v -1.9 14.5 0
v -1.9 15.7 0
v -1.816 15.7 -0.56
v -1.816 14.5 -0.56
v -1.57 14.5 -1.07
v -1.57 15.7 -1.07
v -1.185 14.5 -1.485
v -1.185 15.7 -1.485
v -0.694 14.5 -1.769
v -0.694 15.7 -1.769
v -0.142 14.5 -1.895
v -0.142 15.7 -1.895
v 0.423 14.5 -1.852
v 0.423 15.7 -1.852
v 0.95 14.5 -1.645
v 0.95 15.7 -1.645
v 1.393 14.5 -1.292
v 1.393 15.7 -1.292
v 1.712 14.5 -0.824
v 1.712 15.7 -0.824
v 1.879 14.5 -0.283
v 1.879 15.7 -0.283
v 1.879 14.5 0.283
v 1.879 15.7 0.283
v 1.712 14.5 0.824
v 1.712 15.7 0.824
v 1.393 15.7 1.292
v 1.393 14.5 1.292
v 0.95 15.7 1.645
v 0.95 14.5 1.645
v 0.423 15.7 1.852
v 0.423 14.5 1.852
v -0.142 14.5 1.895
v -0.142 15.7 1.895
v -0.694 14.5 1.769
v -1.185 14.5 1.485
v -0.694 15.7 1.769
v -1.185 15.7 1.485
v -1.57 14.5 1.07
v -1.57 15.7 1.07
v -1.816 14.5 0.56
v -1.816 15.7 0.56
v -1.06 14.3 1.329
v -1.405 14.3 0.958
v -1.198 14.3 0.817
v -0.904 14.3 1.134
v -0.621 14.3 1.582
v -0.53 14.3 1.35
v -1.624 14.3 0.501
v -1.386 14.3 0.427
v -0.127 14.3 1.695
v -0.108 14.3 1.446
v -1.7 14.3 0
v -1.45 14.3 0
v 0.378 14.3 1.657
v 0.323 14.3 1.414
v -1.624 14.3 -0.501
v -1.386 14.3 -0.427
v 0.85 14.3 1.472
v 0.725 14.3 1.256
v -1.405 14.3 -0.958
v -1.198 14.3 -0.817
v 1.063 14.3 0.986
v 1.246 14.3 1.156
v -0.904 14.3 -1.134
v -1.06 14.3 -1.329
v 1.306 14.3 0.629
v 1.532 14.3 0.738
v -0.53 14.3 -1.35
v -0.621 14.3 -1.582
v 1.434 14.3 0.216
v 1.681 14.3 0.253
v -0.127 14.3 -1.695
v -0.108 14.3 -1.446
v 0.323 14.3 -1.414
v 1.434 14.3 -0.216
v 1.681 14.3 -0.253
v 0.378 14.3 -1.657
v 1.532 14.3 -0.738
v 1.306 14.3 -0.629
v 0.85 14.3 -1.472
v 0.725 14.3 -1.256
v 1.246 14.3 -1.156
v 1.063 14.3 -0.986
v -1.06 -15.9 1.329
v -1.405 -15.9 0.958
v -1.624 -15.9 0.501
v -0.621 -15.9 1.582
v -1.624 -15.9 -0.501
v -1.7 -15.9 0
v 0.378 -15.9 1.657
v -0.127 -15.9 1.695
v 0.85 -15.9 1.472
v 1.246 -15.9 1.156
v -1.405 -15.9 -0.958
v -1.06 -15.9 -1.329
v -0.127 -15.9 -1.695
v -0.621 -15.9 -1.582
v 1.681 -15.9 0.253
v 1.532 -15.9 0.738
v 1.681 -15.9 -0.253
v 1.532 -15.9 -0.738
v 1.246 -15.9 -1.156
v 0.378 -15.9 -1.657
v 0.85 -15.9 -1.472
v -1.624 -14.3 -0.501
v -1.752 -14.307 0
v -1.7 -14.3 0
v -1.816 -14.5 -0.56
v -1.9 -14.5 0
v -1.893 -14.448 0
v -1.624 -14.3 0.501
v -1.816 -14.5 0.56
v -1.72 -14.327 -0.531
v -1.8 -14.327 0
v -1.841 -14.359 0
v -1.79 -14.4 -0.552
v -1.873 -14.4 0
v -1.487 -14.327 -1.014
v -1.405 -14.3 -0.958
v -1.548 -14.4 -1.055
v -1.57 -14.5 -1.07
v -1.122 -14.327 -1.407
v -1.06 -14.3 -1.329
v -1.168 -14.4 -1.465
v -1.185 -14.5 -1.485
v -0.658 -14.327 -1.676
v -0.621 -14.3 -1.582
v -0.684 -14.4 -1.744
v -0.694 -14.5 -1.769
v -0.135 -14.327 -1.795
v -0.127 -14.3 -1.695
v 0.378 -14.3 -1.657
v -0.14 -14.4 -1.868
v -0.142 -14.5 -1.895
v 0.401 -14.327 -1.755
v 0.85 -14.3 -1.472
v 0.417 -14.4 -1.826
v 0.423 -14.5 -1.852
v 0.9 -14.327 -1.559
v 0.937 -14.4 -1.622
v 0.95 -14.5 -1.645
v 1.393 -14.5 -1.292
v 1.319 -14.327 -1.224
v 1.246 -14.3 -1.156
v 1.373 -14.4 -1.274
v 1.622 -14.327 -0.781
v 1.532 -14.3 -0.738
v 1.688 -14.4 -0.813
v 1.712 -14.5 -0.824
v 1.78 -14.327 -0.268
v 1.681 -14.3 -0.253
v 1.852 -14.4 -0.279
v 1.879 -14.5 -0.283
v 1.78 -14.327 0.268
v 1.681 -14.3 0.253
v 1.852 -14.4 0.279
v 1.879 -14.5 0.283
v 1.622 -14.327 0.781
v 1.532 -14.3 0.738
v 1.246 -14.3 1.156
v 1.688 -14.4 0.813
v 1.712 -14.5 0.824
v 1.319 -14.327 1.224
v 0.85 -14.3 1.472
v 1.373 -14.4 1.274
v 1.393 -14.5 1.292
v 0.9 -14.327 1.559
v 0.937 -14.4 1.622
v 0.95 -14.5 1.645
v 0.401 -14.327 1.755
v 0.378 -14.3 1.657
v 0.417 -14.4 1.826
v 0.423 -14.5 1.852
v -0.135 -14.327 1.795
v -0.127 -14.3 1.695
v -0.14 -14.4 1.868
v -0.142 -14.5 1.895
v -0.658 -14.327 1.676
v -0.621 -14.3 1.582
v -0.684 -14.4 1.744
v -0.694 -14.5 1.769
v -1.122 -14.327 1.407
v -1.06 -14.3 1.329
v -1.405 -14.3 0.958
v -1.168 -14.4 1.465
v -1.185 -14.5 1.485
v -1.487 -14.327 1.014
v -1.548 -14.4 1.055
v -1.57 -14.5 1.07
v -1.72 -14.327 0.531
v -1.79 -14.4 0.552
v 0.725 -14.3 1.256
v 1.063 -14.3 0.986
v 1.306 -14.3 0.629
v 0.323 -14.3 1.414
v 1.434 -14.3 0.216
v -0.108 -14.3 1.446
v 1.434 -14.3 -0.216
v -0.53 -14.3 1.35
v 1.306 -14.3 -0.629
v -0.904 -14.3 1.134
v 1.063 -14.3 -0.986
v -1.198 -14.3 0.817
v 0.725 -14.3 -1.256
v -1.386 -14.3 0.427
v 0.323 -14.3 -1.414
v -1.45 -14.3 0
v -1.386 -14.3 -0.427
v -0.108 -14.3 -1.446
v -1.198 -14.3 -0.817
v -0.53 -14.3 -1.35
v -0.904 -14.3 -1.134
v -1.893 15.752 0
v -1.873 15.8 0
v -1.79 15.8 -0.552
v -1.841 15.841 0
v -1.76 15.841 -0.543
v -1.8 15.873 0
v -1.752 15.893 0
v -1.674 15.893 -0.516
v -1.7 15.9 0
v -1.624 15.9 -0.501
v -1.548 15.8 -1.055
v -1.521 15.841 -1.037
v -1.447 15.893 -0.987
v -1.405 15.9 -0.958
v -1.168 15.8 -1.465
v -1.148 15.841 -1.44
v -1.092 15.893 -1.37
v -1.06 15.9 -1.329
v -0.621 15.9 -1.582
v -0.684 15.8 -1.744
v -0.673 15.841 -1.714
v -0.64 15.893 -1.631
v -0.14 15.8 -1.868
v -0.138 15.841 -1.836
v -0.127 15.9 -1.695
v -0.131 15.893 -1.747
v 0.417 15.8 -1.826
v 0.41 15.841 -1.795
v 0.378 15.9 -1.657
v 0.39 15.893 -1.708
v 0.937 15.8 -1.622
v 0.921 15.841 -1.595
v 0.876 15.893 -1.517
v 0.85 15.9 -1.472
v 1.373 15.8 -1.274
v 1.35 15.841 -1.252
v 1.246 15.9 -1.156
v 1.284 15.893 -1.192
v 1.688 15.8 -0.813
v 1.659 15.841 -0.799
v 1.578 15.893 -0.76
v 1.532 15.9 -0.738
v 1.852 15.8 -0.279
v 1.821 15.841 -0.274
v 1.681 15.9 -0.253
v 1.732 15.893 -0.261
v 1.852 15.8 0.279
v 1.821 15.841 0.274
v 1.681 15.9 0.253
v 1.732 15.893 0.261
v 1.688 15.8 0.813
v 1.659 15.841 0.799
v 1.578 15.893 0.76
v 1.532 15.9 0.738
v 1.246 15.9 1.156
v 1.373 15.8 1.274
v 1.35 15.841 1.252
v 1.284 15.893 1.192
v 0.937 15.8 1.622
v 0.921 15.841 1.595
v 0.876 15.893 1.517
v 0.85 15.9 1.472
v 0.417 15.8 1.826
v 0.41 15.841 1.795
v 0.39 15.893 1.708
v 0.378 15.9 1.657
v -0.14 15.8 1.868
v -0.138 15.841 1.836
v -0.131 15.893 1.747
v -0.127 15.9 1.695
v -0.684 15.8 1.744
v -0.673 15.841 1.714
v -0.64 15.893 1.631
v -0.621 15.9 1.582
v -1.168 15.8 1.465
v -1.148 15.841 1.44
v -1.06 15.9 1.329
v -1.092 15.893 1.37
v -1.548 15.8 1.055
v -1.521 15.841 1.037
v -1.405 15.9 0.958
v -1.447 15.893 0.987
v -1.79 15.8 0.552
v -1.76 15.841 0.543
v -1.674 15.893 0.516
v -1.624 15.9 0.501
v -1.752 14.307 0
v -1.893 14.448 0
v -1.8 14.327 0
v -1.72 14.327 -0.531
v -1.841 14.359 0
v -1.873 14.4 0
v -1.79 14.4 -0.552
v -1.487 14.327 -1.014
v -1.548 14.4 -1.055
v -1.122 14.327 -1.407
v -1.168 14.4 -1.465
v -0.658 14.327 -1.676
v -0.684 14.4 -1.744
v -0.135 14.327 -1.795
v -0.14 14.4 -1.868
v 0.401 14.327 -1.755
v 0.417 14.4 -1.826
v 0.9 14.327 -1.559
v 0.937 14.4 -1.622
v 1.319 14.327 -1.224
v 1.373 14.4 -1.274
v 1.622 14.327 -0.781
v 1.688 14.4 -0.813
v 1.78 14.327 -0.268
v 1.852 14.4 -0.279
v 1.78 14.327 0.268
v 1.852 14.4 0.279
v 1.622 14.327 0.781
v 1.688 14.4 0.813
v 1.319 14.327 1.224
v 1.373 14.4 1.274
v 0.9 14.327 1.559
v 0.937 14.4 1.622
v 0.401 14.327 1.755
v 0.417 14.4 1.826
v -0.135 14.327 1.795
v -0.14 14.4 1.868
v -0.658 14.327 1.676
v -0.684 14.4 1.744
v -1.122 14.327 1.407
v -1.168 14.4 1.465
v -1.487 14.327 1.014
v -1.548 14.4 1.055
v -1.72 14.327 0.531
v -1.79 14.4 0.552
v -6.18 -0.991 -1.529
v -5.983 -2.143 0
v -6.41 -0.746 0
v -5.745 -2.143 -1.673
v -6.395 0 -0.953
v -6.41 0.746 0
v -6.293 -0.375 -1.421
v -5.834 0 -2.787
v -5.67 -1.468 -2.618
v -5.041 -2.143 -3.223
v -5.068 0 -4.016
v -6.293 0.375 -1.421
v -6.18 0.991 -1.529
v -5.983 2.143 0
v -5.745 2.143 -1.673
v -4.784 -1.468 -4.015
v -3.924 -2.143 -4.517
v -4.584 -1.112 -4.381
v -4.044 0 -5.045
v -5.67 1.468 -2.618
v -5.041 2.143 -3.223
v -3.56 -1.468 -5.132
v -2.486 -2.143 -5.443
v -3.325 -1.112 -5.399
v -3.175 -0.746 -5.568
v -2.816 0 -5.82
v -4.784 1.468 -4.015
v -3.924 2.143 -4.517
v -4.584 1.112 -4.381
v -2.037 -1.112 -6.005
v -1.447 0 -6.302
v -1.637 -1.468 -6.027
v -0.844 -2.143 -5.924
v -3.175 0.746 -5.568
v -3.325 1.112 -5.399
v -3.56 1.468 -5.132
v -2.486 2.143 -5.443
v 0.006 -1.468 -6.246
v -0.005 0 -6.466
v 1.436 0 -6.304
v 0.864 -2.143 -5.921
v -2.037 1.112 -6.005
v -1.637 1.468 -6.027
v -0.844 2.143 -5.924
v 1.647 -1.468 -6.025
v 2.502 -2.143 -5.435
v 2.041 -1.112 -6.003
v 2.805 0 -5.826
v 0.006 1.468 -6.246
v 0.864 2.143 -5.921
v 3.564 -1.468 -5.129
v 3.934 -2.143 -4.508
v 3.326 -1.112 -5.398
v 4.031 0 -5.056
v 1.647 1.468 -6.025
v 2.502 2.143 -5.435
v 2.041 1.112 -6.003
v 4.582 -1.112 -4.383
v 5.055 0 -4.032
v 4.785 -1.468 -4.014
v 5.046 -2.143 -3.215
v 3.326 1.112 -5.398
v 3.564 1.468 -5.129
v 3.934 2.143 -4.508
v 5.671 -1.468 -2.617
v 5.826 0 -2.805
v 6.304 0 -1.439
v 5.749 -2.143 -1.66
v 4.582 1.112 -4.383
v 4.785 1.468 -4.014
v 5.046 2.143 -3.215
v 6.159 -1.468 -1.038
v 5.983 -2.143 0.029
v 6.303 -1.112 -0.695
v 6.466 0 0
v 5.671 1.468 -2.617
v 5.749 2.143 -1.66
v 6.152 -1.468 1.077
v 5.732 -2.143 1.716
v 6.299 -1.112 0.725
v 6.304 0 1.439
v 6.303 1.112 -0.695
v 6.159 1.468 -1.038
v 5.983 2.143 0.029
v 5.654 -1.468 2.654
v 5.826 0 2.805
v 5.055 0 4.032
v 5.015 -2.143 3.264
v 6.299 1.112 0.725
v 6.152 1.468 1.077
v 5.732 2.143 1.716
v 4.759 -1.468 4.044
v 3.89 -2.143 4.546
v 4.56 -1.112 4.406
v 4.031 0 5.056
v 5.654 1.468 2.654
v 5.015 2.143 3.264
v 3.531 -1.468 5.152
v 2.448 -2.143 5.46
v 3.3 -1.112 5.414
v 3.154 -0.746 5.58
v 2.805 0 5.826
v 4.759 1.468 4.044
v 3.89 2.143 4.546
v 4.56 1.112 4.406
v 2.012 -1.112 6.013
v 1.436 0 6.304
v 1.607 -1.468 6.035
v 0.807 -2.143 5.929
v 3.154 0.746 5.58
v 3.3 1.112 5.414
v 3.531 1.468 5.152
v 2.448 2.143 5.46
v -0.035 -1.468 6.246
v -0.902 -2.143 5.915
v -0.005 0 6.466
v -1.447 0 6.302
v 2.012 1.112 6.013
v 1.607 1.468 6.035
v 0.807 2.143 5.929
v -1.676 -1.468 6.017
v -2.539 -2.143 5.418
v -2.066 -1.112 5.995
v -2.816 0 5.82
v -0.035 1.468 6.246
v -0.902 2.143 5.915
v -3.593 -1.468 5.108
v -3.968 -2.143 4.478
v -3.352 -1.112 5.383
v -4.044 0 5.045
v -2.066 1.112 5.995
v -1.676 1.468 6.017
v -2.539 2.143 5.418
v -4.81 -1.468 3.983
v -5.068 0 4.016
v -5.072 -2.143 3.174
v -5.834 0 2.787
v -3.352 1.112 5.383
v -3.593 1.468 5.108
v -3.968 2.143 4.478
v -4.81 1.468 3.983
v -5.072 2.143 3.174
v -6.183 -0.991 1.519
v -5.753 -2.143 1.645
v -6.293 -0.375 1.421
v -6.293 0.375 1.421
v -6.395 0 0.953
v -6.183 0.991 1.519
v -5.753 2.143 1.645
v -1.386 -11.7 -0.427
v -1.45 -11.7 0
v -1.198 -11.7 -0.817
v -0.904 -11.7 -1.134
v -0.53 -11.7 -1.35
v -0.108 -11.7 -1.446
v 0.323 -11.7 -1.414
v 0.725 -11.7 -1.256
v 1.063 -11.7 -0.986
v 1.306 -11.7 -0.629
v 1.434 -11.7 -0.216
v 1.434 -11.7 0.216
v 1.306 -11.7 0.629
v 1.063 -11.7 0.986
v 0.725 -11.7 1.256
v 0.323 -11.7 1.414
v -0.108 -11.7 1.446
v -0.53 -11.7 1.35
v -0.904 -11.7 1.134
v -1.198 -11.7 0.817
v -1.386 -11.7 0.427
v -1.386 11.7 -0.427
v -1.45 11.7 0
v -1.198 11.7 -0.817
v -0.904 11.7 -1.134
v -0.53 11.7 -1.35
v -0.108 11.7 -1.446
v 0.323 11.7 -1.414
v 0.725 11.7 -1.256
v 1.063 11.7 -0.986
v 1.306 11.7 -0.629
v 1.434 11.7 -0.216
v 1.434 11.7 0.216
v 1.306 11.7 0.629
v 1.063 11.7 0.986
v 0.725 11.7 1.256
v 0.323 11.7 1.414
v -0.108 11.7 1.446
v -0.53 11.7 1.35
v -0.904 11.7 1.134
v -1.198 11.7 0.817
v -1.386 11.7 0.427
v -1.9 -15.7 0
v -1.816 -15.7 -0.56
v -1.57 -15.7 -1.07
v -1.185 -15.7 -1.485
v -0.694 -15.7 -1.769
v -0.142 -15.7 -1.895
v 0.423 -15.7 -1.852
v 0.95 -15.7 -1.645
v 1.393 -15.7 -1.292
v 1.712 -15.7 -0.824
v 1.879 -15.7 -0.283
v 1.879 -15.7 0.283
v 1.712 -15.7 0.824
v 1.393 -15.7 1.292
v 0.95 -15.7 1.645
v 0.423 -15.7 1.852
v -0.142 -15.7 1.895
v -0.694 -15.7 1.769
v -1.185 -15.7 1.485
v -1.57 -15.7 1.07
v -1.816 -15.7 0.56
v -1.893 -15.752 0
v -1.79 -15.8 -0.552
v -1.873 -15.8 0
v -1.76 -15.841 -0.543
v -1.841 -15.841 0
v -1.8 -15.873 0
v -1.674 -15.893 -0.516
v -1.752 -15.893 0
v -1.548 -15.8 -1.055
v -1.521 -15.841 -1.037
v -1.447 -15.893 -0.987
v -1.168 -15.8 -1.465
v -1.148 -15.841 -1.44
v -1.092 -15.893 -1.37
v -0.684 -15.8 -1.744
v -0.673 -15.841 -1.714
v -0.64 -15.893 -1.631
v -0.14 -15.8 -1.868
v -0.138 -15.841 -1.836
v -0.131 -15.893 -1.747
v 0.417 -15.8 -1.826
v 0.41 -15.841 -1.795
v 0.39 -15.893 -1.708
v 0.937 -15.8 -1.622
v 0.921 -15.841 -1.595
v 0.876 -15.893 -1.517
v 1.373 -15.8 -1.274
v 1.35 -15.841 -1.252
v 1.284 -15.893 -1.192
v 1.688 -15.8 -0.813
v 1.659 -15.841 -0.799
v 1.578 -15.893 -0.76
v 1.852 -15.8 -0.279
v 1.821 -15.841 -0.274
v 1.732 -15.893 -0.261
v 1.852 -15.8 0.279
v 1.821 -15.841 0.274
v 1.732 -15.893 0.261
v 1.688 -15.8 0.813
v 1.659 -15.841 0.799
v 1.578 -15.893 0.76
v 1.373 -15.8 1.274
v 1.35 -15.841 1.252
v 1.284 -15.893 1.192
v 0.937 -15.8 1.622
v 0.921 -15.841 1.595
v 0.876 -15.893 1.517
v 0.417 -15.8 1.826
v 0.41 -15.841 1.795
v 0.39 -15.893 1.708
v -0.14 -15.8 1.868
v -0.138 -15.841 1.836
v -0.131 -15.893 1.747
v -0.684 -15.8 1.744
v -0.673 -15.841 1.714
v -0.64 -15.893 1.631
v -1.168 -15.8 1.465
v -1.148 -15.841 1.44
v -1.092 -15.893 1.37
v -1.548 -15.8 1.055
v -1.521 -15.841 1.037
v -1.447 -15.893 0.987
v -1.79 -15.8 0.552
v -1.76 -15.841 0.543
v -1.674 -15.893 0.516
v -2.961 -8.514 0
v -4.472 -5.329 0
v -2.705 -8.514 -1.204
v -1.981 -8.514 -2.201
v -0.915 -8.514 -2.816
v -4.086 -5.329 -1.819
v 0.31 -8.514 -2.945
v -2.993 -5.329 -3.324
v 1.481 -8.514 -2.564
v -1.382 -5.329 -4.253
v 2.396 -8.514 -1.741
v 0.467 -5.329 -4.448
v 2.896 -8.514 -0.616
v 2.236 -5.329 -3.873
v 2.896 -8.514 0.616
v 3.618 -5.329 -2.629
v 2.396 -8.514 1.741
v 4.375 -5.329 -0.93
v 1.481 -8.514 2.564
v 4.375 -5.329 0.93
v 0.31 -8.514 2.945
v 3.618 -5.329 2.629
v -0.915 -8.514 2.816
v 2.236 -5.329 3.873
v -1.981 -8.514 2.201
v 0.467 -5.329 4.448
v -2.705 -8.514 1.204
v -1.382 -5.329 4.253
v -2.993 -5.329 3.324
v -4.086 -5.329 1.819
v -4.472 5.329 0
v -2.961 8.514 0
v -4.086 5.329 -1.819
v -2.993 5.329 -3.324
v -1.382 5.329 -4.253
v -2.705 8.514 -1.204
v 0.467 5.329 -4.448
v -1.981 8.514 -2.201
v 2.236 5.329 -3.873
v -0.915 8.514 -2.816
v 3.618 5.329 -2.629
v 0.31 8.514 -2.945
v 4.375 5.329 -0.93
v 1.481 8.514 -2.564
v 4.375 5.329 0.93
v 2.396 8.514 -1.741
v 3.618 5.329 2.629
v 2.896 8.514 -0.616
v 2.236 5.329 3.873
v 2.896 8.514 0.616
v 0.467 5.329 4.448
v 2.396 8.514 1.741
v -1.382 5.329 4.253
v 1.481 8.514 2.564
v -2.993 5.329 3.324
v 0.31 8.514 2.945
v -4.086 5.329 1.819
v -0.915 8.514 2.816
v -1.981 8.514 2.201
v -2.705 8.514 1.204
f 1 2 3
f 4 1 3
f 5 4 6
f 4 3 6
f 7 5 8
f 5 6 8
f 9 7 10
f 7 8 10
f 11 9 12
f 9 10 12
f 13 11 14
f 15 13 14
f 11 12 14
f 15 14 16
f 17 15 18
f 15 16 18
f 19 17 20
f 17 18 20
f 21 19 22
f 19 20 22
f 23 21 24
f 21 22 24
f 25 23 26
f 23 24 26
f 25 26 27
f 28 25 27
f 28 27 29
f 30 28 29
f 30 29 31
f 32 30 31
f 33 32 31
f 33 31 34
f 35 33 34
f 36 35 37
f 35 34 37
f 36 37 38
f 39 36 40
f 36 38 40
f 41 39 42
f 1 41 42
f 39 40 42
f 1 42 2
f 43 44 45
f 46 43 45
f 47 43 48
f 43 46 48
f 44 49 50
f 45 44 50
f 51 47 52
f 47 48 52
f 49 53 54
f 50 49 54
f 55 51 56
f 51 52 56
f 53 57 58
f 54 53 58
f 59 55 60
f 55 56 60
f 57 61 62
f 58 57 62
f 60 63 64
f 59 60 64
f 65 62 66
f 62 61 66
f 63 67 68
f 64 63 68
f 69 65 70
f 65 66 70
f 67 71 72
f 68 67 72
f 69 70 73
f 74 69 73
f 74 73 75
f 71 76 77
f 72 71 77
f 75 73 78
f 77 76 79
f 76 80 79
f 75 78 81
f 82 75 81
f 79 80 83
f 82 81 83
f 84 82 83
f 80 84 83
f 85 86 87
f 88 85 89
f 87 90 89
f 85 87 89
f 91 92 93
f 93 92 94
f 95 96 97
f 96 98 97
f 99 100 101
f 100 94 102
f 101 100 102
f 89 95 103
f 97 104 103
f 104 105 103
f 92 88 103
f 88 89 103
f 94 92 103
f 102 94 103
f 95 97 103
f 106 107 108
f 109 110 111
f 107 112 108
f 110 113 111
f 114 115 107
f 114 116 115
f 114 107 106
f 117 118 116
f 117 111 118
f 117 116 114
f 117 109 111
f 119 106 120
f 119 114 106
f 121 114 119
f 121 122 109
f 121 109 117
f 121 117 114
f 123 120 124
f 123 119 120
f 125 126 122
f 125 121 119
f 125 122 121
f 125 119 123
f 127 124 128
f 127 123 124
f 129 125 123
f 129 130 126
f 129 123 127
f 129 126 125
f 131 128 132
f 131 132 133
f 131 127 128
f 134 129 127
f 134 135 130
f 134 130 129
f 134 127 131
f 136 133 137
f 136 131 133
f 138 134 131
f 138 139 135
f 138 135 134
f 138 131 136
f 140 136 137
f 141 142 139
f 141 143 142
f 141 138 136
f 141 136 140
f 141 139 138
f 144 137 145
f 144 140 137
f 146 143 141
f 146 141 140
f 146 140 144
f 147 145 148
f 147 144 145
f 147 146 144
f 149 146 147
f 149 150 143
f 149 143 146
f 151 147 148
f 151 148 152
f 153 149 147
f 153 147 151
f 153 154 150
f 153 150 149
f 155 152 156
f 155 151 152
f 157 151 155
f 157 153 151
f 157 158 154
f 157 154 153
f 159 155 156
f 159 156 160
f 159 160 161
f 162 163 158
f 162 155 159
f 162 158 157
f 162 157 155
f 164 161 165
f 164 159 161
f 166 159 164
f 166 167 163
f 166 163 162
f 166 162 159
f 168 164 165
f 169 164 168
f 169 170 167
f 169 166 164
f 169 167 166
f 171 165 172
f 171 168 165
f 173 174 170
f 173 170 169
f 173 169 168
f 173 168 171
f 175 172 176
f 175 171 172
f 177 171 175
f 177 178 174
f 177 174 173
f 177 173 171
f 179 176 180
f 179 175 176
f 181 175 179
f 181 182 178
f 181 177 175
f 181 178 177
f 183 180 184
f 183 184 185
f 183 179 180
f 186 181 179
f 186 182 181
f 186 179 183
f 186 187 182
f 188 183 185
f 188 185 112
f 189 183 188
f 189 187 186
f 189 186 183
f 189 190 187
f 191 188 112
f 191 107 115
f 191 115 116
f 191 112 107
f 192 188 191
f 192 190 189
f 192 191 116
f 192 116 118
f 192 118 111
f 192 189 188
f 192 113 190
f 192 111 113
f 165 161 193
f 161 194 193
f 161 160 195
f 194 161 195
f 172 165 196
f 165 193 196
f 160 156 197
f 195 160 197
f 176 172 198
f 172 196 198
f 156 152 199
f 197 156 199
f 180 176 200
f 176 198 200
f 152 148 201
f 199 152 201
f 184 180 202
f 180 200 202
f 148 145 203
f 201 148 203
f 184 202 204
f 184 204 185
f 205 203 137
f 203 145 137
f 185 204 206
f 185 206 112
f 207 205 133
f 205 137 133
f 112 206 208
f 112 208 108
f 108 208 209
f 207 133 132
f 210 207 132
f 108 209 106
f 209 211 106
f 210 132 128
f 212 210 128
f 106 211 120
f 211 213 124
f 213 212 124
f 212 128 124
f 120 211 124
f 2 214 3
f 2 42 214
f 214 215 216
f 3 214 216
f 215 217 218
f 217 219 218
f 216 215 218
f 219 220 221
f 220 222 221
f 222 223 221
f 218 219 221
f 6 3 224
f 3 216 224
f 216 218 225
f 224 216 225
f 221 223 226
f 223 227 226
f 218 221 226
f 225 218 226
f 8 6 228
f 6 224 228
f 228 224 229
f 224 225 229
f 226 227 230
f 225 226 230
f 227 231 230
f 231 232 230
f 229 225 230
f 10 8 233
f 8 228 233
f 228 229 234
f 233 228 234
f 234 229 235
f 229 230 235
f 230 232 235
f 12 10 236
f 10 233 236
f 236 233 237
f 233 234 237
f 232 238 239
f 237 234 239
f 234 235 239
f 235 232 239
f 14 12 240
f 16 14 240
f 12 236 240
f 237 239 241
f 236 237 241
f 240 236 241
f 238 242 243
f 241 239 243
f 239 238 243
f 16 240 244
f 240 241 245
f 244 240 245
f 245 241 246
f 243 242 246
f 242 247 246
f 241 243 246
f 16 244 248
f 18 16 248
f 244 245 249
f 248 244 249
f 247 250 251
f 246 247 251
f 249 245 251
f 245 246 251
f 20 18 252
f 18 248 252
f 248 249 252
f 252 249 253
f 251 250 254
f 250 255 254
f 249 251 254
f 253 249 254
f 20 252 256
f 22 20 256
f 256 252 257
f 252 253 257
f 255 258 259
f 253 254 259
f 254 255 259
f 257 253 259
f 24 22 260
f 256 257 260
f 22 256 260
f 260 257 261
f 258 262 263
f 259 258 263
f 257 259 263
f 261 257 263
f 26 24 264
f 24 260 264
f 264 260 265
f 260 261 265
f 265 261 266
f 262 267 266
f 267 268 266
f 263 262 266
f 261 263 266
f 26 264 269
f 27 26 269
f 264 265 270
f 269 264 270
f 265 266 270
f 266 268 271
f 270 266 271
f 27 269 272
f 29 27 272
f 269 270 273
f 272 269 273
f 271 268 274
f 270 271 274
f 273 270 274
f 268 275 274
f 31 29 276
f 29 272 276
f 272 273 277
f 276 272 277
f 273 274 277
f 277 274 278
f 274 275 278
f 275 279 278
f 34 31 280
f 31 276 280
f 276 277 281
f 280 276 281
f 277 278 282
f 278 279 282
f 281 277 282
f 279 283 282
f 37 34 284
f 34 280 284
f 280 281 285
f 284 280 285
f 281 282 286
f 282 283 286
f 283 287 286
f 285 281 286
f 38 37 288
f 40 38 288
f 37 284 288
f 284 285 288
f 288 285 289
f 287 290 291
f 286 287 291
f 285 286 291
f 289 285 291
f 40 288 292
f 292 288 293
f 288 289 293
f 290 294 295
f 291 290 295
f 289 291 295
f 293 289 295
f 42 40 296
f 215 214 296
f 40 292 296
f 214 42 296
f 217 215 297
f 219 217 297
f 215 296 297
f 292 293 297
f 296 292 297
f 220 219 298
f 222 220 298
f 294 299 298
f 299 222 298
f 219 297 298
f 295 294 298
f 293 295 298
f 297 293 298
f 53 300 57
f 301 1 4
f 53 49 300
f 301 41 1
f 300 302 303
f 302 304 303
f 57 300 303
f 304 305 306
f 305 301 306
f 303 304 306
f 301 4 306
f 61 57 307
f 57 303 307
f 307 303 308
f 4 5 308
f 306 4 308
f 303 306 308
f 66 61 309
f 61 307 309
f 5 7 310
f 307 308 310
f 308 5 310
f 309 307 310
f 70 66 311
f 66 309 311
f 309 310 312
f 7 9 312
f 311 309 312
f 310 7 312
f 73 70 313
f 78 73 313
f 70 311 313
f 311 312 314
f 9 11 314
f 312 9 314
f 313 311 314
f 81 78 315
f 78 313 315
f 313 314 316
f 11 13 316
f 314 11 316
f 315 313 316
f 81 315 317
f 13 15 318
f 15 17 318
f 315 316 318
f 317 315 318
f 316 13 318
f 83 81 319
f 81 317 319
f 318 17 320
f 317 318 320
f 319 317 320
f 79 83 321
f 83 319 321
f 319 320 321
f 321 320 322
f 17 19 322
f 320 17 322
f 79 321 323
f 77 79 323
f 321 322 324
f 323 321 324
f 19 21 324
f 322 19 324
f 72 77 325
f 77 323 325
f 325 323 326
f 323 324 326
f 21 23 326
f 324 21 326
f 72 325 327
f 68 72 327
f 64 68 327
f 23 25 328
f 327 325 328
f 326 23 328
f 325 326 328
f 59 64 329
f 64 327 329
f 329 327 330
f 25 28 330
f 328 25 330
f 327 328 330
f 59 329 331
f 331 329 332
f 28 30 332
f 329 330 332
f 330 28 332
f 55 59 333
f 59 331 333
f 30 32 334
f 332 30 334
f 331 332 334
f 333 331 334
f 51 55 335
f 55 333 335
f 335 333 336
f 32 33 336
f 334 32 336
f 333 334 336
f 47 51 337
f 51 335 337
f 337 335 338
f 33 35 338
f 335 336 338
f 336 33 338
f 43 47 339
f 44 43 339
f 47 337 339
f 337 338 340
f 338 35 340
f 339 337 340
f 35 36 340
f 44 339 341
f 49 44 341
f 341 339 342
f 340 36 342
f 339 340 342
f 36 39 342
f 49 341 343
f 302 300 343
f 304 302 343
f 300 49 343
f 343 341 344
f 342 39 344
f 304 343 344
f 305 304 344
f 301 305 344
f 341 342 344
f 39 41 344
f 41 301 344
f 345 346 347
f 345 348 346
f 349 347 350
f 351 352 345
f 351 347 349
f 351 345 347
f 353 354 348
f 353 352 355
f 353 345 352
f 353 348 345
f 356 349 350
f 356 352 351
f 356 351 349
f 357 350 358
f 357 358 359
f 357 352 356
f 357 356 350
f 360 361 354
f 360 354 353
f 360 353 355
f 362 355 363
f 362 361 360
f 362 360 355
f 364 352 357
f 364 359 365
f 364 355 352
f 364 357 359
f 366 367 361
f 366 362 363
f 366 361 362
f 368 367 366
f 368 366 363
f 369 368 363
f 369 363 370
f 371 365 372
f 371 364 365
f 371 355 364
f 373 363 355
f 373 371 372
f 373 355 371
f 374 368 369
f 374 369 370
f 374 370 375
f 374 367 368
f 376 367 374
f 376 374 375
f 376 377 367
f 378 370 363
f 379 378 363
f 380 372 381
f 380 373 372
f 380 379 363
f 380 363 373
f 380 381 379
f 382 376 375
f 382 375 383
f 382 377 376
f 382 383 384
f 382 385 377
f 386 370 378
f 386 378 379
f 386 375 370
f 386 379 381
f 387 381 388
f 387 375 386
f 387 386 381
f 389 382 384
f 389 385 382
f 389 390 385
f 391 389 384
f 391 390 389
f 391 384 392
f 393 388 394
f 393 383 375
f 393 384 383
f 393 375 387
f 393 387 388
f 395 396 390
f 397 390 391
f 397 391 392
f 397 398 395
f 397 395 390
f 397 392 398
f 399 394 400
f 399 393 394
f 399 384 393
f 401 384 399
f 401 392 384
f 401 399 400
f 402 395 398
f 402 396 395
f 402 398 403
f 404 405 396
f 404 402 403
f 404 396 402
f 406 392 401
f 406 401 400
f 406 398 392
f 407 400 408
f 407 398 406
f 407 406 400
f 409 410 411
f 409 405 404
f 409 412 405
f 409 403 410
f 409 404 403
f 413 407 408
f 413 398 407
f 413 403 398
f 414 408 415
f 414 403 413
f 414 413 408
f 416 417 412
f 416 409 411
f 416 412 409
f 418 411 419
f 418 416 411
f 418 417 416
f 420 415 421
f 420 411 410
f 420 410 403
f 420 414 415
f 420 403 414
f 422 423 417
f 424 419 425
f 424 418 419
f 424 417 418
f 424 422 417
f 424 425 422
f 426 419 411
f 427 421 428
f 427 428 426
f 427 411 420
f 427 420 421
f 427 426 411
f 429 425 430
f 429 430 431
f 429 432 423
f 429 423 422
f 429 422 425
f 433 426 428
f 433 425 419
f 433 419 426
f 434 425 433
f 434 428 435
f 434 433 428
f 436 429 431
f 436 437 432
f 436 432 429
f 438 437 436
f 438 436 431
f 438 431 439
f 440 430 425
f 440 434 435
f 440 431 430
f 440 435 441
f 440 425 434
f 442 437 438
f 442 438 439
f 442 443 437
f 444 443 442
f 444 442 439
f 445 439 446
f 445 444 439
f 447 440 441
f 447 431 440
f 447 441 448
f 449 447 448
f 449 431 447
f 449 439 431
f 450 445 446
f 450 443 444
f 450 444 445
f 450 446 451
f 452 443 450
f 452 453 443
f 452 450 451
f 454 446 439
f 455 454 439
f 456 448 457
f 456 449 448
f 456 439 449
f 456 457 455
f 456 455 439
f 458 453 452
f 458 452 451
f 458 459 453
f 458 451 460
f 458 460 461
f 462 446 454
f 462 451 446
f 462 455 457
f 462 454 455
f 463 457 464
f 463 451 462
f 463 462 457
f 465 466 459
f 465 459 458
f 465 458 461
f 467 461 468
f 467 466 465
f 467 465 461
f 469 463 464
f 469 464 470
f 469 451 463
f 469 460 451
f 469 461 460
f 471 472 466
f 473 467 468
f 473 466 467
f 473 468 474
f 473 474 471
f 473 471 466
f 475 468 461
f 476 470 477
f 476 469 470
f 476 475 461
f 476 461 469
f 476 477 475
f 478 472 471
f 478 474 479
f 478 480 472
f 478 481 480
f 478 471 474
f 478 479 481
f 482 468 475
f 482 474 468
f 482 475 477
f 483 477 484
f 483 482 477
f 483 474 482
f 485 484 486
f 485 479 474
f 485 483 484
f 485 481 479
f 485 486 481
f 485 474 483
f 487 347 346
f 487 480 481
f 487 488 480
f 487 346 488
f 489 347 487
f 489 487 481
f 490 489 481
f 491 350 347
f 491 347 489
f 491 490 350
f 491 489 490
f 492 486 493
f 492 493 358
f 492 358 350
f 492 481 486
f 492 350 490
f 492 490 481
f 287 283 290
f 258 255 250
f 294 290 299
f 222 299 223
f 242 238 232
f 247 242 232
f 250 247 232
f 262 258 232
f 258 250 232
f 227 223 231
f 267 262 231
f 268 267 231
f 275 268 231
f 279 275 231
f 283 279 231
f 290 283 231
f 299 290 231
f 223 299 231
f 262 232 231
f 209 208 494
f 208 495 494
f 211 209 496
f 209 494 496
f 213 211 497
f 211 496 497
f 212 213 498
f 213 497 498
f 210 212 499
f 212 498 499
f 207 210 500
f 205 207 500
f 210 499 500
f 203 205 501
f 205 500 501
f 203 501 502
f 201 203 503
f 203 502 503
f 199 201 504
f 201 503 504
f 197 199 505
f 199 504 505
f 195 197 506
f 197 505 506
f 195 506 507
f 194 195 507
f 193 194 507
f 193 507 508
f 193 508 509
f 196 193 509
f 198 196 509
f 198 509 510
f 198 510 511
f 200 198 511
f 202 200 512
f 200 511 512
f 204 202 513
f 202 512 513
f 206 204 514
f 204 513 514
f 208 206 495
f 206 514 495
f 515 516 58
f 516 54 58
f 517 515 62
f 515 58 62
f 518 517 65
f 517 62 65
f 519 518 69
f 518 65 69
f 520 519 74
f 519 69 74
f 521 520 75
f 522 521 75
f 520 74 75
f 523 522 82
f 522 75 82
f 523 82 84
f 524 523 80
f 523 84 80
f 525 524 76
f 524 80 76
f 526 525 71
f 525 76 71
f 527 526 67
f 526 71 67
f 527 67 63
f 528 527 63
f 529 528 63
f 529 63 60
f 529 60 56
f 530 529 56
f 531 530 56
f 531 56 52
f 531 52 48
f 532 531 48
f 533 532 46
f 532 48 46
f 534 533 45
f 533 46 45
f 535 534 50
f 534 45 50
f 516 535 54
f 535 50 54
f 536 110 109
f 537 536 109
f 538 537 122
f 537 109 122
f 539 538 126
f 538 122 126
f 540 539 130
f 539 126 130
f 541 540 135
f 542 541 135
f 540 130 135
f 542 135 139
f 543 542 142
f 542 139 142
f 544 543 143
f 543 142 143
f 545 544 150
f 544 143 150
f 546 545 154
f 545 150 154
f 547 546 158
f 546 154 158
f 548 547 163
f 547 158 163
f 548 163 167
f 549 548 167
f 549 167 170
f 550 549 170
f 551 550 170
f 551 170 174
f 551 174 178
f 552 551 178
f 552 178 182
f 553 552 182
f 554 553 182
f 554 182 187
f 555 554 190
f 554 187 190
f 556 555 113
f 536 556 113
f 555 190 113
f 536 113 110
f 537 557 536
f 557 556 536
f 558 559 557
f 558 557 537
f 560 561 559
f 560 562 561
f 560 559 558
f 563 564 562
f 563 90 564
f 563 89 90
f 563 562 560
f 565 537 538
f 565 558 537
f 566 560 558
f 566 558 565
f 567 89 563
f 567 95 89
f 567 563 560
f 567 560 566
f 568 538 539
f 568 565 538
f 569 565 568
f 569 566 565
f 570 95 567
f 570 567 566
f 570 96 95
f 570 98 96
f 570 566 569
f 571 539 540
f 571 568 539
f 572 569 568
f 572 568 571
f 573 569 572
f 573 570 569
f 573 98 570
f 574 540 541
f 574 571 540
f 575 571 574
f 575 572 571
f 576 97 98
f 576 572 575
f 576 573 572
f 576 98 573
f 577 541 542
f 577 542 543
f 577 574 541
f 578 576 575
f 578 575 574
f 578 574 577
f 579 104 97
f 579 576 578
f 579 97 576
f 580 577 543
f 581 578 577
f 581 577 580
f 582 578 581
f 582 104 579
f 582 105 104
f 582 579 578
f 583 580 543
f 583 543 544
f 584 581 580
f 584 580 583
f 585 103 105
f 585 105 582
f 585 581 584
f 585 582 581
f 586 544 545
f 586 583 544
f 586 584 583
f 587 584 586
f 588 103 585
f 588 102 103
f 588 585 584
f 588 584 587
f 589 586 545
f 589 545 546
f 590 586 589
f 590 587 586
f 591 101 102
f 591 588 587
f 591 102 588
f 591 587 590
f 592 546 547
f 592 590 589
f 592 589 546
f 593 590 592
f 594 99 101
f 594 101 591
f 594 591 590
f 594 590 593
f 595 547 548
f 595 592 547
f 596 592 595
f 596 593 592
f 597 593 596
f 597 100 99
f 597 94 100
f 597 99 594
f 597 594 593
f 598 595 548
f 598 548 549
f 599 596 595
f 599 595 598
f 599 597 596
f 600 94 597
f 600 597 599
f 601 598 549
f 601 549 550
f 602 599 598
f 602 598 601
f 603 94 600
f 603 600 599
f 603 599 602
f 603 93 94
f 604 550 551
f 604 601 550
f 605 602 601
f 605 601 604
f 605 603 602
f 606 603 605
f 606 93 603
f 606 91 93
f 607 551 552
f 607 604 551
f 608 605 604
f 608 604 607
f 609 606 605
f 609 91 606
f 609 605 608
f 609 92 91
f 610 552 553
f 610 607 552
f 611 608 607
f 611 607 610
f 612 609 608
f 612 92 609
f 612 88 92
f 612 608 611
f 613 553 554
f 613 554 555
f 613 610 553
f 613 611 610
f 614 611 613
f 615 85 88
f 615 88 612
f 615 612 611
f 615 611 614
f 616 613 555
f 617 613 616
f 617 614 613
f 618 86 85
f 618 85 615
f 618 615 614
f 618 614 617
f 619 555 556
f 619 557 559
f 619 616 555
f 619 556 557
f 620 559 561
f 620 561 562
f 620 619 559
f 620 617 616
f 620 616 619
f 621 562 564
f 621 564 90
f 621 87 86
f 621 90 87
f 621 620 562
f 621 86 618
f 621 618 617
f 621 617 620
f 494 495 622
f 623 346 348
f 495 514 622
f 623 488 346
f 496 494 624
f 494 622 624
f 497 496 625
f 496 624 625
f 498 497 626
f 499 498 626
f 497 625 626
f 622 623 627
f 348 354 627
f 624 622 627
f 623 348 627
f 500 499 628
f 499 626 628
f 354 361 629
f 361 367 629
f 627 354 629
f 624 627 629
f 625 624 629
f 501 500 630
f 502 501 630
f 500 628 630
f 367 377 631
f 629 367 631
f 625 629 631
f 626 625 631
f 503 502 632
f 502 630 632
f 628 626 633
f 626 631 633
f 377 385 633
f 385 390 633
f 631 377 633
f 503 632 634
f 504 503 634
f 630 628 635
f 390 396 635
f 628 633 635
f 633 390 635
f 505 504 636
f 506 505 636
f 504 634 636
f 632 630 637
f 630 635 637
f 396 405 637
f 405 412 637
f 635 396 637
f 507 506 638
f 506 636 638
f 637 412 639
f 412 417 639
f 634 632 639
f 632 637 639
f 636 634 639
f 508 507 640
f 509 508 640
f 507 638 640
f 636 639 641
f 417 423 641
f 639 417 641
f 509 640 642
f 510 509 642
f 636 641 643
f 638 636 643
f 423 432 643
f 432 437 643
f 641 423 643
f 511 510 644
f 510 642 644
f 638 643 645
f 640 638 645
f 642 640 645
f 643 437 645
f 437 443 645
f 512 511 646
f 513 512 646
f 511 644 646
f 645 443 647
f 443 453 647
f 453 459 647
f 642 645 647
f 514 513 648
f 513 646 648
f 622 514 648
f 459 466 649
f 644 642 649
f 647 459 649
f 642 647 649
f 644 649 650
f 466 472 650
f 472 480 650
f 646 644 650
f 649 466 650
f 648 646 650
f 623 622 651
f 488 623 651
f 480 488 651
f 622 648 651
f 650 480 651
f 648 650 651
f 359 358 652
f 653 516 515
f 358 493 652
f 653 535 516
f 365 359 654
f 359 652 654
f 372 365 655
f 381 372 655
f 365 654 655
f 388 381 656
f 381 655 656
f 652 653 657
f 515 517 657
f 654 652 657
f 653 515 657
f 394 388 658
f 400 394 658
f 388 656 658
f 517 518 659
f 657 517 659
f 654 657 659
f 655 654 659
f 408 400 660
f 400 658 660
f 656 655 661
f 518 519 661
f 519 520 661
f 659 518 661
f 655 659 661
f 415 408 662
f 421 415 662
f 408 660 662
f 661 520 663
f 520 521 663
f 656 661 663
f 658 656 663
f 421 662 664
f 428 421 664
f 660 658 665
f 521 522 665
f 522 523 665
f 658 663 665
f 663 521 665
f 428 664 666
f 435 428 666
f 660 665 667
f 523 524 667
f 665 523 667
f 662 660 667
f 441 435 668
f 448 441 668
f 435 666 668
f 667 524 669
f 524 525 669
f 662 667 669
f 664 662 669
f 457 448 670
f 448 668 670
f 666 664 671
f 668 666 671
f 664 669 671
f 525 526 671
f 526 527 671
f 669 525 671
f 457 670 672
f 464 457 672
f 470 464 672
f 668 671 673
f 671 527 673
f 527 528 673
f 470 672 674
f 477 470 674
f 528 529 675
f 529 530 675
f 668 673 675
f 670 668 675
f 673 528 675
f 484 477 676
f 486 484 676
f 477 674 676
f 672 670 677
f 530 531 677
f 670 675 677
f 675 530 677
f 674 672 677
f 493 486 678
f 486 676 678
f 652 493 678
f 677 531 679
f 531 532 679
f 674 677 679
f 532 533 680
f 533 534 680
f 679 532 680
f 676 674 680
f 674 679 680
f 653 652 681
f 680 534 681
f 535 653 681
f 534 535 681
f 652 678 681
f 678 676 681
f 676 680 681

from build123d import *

# Parameters (mm, degrees)
CONG_1_R = 5
CONG_2_R = 0.2


with BuildPart() as part:
    # Esquisse1 → Révolution1 (revolve)
    with BuildSketch(Plane.XY, mode=Mode.PRIVATE) as r_volution1_sk:
        Polygon((0, 15.9), (0, -15.9), (1.9, -15.9), (1.9, -14.3), (1.45, -14.3), (1.45, -11.7), (7, 0), (1.45, 11.7), (1.45, 14.3), (1.9, 14.3), (1.9, 15.9), align=None)
    revolve(r_volution1_sk.sketch.rotate(Axis((0, 15.9, 0), (0, -1, 0)), 180), axis=Axis((0, 15.9, 0), (0, -1, 0)))  # turned: the seam where the file's is

    # Congé1
    cong_1_edges = [part.edges().sort_by_distance(p)[0] for p in [
        (7, 0, 0),
    ]]
    fillet(cong_1_edges, radius=CONG_1_R)

    # Congé2
    cong_2_edges = [part.edges().sort_by_distance(p)[0] for p in [
        (1.9, -14.3, 0),
        (1.9, 14.3, 0),
        (1.9, 15.9, 0),
        (1.9, -15.9, 0),
    ]]
    fillet(cong_2_edges, radius=CONG_2_R)


solid = part.part
